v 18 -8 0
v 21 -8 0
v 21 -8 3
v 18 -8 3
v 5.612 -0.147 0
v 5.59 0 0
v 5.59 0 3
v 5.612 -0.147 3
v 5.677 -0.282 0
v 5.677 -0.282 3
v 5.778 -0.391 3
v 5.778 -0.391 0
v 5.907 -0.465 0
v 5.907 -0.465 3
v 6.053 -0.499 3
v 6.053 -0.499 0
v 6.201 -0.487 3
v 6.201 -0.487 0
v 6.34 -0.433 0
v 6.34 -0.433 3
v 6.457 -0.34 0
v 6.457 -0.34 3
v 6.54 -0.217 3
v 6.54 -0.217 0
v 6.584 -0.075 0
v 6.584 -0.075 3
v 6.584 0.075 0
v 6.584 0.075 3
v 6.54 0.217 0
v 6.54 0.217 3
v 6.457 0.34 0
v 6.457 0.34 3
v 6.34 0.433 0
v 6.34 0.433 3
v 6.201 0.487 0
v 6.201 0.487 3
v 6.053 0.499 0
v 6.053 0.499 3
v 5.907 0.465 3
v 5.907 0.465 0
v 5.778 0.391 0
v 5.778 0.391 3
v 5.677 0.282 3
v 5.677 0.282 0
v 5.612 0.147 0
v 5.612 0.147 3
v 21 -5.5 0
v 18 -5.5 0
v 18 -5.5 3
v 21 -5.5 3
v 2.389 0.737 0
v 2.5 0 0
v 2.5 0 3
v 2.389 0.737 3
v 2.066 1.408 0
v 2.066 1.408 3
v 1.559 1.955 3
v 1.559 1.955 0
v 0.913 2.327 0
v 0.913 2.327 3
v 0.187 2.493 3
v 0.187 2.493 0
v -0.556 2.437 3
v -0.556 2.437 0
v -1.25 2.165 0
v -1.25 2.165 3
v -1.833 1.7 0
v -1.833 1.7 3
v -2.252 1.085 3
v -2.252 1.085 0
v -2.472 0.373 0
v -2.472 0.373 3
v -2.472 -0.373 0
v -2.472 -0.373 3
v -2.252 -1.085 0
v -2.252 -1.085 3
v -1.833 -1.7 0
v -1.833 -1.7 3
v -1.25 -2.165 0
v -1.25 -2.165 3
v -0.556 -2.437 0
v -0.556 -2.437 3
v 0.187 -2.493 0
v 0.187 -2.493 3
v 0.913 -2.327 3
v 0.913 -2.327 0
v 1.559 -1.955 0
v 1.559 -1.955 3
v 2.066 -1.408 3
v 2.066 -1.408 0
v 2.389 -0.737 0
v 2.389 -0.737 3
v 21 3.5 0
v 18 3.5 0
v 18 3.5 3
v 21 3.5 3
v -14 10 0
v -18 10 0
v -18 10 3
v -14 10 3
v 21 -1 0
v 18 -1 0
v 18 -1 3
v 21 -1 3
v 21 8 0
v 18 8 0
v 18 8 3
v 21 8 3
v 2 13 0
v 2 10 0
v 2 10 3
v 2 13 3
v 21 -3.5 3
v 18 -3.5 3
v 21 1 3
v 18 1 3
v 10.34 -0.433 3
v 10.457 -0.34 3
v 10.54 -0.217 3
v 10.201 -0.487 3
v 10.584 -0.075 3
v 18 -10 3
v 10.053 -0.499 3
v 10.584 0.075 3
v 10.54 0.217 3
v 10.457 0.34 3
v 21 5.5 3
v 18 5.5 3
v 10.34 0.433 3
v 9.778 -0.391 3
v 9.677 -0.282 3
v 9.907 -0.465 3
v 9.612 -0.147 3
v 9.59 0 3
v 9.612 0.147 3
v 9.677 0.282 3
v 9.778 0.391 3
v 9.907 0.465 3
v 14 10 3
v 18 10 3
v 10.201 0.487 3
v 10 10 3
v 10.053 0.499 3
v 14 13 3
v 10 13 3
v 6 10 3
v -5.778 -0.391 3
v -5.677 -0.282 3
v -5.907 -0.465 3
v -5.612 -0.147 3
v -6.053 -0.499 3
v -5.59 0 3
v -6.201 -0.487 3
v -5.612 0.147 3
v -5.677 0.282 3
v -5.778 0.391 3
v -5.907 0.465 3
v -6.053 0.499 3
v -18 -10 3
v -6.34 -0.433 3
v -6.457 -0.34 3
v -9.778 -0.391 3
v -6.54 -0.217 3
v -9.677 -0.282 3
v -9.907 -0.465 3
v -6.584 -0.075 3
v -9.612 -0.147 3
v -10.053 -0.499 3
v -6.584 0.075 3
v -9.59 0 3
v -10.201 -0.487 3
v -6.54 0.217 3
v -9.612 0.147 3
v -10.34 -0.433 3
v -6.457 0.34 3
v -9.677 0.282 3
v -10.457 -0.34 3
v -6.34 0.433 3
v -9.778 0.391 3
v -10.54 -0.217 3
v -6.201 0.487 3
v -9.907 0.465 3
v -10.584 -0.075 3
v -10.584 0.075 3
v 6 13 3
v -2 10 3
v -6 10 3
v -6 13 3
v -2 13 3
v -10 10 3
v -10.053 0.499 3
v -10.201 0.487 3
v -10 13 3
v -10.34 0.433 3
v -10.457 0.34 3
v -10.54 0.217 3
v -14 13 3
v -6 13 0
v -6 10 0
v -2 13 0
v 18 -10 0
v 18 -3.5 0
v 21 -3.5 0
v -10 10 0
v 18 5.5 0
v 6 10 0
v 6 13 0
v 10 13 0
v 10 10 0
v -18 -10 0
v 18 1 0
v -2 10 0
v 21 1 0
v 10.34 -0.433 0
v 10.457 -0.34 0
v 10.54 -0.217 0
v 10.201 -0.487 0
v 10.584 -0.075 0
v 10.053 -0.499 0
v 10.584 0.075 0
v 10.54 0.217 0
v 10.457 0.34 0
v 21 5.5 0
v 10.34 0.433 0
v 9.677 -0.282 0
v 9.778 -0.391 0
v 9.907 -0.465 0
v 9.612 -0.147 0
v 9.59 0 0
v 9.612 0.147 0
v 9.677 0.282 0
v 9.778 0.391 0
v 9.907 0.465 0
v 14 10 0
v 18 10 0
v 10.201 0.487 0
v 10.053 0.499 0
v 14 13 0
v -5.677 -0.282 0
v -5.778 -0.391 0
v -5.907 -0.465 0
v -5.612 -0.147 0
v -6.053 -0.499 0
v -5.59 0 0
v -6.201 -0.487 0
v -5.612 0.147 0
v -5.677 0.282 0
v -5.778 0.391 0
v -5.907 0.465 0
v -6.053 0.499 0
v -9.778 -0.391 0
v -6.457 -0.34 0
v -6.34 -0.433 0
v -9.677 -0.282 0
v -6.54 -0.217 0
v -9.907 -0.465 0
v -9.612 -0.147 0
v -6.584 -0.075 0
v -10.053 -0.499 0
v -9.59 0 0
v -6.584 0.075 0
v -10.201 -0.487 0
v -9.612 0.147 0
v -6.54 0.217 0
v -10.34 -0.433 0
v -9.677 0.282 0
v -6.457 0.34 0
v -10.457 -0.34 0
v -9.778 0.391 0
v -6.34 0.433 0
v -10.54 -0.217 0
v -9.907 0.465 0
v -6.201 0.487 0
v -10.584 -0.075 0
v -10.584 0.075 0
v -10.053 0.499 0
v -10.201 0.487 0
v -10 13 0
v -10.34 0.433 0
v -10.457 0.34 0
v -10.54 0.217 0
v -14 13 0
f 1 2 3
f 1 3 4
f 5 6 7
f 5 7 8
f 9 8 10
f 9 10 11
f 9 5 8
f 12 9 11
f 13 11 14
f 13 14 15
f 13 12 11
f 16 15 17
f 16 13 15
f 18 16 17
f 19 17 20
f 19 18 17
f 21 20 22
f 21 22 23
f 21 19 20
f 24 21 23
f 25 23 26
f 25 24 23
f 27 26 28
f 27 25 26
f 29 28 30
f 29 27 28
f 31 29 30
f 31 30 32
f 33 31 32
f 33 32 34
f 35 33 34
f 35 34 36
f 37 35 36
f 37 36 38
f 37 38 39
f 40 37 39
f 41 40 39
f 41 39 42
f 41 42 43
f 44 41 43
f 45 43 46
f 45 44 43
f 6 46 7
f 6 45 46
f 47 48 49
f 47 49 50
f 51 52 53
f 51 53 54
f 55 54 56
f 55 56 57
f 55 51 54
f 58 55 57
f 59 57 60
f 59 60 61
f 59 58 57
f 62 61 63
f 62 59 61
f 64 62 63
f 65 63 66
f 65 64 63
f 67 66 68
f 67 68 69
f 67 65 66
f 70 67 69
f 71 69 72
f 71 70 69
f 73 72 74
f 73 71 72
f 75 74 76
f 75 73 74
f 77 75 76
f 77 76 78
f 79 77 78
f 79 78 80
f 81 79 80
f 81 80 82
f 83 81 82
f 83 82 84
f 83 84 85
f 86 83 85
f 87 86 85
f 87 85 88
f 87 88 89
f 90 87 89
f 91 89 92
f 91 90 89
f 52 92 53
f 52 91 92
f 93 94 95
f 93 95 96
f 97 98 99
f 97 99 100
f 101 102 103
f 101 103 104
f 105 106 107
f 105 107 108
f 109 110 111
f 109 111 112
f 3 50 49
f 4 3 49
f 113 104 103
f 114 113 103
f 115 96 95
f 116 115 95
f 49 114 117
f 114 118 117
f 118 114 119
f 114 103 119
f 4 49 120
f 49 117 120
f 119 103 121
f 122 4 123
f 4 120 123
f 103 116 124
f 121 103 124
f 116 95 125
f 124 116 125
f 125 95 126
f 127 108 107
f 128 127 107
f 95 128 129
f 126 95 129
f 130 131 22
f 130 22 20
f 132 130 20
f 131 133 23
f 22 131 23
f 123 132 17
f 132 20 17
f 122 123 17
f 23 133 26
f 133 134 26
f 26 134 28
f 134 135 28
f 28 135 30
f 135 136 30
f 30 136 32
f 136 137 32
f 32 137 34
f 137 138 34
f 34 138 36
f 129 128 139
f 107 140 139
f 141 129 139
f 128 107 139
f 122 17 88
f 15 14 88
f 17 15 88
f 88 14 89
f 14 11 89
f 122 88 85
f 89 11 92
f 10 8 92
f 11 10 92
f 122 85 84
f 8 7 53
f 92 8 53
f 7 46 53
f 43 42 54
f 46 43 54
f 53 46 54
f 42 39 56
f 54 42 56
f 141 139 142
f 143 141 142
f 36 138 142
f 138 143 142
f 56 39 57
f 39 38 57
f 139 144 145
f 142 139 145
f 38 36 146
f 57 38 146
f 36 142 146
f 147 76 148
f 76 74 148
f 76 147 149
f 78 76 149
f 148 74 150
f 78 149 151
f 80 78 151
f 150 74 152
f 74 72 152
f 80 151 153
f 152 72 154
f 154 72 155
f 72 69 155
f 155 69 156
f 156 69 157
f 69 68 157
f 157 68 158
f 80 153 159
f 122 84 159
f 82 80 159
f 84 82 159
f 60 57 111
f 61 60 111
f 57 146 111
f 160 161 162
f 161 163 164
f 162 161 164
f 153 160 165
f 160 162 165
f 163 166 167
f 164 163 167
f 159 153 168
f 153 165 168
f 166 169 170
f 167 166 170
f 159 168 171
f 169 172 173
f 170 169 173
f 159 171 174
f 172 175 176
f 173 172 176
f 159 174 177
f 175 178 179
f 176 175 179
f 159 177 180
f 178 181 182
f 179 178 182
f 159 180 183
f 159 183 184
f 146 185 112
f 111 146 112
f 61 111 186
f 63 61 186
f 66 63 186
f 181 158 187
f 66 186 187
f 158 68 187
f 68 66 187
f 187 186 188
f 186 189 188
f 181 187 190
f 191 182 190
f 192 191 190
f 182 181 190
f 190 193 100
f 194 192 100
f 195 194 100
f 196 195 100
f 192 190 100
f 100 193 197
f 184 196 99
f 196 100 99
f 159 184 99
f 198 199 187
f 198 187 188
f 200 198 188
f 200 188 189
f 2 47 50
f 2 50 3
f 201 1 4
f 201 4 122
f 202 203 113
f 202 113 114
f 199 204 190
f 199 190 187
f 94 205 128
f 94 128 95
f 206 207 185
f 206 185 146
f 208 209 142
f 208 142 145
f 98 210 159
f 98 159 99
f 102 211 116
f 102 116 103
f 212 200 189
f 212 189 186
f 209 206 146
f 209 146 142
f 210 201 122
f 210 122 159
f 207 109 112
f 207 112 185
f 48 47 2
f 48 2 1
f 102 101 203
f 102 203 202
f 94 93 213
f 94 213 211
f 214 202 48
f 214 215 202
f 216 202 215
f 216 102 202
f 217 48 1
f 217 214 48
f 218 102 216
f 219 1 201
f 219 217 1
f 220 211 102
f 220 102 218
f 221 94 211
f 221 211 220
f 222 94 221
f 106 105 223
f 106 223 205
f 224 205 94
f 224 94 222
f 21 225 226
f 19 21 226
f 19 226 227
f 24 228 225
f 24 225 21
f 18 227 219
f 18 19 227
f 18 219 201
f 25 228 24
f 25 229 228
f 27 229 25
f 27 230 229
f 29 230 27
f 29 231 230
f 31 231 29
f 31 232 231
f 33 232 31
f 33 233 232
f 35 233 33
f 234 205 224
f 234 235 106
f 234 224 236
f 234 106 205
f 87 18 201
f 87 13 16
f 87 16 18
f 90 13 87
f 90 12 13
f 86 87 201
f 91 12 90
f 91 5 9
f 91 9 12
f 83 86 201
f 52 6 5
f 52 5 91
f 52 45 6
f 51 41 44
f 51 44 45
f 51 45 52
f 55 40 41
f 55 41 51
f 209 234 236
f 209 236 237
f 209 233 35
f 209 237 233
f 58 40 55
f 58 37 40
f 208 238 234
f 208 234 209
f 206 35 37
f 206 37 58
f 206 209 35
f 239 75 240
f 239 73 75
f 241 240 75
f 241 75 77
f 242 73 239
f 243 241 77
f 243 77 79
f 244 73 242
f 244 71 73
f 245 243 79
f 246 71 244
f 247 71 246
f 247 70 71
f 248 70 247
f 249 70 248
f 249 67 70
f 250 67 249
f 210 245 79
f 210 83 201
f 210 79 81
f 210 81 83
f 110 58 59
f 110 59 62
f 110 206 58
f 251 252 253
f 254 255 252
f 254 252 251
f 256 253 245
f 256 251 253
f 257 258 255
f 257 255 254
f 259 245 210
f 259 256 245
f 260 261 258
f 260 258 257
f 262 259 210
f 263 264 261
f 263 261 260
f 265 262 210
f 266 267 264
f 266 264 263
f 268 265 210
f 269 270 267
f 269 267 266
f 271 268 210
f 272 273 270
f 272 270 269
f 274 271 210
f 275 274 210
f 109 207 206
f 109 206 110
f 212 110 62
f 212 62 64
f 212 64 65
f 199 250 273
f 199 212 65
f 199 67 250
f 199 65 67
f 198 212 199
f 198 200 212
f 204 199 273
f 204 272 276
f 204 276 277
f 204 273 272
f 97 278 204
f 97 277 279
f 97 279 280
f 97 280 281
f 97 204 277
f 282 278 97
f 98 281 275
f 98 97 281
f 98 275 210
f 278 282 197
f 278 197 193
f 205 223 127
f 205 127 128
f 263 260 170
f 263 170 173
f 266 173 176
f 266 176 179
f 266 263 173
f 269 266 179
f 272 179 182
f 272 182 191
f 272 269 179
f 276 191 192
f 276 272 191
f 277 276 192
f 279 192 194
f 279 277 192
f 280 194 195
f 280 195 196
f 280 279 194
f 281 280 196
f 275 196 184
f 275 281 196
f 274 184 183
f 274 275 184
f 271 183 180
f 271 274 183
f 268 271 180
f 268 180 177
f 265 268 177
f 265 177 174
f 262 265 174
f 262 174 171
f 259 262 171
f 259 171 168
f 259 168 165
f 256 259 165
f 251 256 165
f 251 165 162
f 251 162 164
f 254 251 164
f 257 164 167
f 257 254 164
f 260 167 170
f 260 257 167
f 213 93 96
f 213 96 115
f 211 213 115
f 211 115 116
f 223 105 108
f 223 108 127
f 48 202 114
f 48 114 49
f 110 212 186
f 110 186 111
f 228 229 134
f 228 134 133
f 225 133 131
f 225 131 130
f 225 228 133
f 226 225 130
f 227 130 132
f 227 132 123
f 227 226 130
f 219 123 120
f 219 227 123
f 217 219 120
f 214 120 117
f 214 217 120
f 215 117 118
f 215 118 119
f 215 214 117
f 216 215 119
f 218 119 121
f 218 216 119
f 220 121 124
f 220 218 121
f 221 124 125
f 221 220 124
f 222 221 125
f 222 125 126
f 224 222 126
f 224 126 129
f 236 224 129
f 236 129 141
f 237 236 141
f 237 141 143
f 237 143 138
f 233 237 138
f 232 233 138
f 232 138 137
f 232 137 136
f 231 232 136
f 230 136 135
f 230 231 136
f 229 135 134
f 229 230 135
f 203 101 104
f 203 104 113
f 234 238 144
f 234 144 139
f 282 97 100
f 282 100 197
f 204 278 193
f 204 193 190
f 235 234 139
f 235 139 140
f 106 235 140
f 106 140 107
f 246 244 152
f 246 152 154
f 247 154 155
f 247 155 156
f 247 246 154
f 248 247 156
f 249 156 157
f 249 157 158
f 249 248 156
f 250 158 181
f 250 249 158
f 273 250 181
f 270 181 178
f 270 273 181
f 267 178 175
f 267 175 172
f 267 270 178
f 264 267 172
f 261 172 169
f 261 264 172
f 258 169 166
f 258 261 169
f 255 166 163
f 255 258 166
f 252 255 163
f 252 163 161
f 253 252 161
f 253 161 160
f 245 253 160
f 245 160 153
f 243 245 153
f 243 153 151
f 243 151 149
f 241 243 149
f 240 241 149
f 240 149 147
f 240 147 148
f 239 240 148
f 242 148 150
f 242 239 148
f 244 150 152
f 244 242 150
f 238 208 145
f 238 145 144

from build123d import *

# Parameters (mm, degrees)
SKETCH1_R           = 2.5
SKETCH1_R_2         = 0.5
BOSS_EXTRUDE1_DEPTH = 3


with BuildPart() as part:
    # Sketch1 → Boss-Extrude1 (new body)
    with BuildSketch(Plane.XY):
        Polygon((18, 10), (18, 8), (21, 8), (21, 5.5), (18, 5.5), (18, 3.5), (21, 3.5), (21, 1), (18, 1), (18, -1), (21, -1), (21, -3.5), (18, -3.5), (18, -5.5), (21, -5.5), (21, -8), (18, -8), (18, -10), (-18, -10), (-18, 10), (-14, 10), (-14, 13), (-10, 13), (-10, 10), (-6, 10), (-6, 13), (-2, 13), (-2, 10), (2, 10), (2, 13), (6, 13), (6, 10), (10, 10), (10, 13), (14, 13), (14, 10), align=None)
        Circle(SKETCH1_R, mode=Mode.SUBTRACT)
        with Locations((-6.09, 0)):
            Circle(SKETCH1_R_2, mode=Mode.SUBTRACT)
        with Locations((-10.09, 0)):
            Circle(SKETCH1_R_2, mode=Mode.SUBTRACT)
        with Locations(Location((10.09, 0, 0), (0, 0, 180))):
            Circle(SKETCH1_R_2, mode=Mode.SUBTRACT)
        with Locations(Location((6.09, 0, 0), (0, 0, 180))):
            Circle(SKETCH1_R_2, mode=Mode.SUBTRACT)
    extrude(amount=BOSS_EXTRUDE1_DEPTH)


solid = part.part
